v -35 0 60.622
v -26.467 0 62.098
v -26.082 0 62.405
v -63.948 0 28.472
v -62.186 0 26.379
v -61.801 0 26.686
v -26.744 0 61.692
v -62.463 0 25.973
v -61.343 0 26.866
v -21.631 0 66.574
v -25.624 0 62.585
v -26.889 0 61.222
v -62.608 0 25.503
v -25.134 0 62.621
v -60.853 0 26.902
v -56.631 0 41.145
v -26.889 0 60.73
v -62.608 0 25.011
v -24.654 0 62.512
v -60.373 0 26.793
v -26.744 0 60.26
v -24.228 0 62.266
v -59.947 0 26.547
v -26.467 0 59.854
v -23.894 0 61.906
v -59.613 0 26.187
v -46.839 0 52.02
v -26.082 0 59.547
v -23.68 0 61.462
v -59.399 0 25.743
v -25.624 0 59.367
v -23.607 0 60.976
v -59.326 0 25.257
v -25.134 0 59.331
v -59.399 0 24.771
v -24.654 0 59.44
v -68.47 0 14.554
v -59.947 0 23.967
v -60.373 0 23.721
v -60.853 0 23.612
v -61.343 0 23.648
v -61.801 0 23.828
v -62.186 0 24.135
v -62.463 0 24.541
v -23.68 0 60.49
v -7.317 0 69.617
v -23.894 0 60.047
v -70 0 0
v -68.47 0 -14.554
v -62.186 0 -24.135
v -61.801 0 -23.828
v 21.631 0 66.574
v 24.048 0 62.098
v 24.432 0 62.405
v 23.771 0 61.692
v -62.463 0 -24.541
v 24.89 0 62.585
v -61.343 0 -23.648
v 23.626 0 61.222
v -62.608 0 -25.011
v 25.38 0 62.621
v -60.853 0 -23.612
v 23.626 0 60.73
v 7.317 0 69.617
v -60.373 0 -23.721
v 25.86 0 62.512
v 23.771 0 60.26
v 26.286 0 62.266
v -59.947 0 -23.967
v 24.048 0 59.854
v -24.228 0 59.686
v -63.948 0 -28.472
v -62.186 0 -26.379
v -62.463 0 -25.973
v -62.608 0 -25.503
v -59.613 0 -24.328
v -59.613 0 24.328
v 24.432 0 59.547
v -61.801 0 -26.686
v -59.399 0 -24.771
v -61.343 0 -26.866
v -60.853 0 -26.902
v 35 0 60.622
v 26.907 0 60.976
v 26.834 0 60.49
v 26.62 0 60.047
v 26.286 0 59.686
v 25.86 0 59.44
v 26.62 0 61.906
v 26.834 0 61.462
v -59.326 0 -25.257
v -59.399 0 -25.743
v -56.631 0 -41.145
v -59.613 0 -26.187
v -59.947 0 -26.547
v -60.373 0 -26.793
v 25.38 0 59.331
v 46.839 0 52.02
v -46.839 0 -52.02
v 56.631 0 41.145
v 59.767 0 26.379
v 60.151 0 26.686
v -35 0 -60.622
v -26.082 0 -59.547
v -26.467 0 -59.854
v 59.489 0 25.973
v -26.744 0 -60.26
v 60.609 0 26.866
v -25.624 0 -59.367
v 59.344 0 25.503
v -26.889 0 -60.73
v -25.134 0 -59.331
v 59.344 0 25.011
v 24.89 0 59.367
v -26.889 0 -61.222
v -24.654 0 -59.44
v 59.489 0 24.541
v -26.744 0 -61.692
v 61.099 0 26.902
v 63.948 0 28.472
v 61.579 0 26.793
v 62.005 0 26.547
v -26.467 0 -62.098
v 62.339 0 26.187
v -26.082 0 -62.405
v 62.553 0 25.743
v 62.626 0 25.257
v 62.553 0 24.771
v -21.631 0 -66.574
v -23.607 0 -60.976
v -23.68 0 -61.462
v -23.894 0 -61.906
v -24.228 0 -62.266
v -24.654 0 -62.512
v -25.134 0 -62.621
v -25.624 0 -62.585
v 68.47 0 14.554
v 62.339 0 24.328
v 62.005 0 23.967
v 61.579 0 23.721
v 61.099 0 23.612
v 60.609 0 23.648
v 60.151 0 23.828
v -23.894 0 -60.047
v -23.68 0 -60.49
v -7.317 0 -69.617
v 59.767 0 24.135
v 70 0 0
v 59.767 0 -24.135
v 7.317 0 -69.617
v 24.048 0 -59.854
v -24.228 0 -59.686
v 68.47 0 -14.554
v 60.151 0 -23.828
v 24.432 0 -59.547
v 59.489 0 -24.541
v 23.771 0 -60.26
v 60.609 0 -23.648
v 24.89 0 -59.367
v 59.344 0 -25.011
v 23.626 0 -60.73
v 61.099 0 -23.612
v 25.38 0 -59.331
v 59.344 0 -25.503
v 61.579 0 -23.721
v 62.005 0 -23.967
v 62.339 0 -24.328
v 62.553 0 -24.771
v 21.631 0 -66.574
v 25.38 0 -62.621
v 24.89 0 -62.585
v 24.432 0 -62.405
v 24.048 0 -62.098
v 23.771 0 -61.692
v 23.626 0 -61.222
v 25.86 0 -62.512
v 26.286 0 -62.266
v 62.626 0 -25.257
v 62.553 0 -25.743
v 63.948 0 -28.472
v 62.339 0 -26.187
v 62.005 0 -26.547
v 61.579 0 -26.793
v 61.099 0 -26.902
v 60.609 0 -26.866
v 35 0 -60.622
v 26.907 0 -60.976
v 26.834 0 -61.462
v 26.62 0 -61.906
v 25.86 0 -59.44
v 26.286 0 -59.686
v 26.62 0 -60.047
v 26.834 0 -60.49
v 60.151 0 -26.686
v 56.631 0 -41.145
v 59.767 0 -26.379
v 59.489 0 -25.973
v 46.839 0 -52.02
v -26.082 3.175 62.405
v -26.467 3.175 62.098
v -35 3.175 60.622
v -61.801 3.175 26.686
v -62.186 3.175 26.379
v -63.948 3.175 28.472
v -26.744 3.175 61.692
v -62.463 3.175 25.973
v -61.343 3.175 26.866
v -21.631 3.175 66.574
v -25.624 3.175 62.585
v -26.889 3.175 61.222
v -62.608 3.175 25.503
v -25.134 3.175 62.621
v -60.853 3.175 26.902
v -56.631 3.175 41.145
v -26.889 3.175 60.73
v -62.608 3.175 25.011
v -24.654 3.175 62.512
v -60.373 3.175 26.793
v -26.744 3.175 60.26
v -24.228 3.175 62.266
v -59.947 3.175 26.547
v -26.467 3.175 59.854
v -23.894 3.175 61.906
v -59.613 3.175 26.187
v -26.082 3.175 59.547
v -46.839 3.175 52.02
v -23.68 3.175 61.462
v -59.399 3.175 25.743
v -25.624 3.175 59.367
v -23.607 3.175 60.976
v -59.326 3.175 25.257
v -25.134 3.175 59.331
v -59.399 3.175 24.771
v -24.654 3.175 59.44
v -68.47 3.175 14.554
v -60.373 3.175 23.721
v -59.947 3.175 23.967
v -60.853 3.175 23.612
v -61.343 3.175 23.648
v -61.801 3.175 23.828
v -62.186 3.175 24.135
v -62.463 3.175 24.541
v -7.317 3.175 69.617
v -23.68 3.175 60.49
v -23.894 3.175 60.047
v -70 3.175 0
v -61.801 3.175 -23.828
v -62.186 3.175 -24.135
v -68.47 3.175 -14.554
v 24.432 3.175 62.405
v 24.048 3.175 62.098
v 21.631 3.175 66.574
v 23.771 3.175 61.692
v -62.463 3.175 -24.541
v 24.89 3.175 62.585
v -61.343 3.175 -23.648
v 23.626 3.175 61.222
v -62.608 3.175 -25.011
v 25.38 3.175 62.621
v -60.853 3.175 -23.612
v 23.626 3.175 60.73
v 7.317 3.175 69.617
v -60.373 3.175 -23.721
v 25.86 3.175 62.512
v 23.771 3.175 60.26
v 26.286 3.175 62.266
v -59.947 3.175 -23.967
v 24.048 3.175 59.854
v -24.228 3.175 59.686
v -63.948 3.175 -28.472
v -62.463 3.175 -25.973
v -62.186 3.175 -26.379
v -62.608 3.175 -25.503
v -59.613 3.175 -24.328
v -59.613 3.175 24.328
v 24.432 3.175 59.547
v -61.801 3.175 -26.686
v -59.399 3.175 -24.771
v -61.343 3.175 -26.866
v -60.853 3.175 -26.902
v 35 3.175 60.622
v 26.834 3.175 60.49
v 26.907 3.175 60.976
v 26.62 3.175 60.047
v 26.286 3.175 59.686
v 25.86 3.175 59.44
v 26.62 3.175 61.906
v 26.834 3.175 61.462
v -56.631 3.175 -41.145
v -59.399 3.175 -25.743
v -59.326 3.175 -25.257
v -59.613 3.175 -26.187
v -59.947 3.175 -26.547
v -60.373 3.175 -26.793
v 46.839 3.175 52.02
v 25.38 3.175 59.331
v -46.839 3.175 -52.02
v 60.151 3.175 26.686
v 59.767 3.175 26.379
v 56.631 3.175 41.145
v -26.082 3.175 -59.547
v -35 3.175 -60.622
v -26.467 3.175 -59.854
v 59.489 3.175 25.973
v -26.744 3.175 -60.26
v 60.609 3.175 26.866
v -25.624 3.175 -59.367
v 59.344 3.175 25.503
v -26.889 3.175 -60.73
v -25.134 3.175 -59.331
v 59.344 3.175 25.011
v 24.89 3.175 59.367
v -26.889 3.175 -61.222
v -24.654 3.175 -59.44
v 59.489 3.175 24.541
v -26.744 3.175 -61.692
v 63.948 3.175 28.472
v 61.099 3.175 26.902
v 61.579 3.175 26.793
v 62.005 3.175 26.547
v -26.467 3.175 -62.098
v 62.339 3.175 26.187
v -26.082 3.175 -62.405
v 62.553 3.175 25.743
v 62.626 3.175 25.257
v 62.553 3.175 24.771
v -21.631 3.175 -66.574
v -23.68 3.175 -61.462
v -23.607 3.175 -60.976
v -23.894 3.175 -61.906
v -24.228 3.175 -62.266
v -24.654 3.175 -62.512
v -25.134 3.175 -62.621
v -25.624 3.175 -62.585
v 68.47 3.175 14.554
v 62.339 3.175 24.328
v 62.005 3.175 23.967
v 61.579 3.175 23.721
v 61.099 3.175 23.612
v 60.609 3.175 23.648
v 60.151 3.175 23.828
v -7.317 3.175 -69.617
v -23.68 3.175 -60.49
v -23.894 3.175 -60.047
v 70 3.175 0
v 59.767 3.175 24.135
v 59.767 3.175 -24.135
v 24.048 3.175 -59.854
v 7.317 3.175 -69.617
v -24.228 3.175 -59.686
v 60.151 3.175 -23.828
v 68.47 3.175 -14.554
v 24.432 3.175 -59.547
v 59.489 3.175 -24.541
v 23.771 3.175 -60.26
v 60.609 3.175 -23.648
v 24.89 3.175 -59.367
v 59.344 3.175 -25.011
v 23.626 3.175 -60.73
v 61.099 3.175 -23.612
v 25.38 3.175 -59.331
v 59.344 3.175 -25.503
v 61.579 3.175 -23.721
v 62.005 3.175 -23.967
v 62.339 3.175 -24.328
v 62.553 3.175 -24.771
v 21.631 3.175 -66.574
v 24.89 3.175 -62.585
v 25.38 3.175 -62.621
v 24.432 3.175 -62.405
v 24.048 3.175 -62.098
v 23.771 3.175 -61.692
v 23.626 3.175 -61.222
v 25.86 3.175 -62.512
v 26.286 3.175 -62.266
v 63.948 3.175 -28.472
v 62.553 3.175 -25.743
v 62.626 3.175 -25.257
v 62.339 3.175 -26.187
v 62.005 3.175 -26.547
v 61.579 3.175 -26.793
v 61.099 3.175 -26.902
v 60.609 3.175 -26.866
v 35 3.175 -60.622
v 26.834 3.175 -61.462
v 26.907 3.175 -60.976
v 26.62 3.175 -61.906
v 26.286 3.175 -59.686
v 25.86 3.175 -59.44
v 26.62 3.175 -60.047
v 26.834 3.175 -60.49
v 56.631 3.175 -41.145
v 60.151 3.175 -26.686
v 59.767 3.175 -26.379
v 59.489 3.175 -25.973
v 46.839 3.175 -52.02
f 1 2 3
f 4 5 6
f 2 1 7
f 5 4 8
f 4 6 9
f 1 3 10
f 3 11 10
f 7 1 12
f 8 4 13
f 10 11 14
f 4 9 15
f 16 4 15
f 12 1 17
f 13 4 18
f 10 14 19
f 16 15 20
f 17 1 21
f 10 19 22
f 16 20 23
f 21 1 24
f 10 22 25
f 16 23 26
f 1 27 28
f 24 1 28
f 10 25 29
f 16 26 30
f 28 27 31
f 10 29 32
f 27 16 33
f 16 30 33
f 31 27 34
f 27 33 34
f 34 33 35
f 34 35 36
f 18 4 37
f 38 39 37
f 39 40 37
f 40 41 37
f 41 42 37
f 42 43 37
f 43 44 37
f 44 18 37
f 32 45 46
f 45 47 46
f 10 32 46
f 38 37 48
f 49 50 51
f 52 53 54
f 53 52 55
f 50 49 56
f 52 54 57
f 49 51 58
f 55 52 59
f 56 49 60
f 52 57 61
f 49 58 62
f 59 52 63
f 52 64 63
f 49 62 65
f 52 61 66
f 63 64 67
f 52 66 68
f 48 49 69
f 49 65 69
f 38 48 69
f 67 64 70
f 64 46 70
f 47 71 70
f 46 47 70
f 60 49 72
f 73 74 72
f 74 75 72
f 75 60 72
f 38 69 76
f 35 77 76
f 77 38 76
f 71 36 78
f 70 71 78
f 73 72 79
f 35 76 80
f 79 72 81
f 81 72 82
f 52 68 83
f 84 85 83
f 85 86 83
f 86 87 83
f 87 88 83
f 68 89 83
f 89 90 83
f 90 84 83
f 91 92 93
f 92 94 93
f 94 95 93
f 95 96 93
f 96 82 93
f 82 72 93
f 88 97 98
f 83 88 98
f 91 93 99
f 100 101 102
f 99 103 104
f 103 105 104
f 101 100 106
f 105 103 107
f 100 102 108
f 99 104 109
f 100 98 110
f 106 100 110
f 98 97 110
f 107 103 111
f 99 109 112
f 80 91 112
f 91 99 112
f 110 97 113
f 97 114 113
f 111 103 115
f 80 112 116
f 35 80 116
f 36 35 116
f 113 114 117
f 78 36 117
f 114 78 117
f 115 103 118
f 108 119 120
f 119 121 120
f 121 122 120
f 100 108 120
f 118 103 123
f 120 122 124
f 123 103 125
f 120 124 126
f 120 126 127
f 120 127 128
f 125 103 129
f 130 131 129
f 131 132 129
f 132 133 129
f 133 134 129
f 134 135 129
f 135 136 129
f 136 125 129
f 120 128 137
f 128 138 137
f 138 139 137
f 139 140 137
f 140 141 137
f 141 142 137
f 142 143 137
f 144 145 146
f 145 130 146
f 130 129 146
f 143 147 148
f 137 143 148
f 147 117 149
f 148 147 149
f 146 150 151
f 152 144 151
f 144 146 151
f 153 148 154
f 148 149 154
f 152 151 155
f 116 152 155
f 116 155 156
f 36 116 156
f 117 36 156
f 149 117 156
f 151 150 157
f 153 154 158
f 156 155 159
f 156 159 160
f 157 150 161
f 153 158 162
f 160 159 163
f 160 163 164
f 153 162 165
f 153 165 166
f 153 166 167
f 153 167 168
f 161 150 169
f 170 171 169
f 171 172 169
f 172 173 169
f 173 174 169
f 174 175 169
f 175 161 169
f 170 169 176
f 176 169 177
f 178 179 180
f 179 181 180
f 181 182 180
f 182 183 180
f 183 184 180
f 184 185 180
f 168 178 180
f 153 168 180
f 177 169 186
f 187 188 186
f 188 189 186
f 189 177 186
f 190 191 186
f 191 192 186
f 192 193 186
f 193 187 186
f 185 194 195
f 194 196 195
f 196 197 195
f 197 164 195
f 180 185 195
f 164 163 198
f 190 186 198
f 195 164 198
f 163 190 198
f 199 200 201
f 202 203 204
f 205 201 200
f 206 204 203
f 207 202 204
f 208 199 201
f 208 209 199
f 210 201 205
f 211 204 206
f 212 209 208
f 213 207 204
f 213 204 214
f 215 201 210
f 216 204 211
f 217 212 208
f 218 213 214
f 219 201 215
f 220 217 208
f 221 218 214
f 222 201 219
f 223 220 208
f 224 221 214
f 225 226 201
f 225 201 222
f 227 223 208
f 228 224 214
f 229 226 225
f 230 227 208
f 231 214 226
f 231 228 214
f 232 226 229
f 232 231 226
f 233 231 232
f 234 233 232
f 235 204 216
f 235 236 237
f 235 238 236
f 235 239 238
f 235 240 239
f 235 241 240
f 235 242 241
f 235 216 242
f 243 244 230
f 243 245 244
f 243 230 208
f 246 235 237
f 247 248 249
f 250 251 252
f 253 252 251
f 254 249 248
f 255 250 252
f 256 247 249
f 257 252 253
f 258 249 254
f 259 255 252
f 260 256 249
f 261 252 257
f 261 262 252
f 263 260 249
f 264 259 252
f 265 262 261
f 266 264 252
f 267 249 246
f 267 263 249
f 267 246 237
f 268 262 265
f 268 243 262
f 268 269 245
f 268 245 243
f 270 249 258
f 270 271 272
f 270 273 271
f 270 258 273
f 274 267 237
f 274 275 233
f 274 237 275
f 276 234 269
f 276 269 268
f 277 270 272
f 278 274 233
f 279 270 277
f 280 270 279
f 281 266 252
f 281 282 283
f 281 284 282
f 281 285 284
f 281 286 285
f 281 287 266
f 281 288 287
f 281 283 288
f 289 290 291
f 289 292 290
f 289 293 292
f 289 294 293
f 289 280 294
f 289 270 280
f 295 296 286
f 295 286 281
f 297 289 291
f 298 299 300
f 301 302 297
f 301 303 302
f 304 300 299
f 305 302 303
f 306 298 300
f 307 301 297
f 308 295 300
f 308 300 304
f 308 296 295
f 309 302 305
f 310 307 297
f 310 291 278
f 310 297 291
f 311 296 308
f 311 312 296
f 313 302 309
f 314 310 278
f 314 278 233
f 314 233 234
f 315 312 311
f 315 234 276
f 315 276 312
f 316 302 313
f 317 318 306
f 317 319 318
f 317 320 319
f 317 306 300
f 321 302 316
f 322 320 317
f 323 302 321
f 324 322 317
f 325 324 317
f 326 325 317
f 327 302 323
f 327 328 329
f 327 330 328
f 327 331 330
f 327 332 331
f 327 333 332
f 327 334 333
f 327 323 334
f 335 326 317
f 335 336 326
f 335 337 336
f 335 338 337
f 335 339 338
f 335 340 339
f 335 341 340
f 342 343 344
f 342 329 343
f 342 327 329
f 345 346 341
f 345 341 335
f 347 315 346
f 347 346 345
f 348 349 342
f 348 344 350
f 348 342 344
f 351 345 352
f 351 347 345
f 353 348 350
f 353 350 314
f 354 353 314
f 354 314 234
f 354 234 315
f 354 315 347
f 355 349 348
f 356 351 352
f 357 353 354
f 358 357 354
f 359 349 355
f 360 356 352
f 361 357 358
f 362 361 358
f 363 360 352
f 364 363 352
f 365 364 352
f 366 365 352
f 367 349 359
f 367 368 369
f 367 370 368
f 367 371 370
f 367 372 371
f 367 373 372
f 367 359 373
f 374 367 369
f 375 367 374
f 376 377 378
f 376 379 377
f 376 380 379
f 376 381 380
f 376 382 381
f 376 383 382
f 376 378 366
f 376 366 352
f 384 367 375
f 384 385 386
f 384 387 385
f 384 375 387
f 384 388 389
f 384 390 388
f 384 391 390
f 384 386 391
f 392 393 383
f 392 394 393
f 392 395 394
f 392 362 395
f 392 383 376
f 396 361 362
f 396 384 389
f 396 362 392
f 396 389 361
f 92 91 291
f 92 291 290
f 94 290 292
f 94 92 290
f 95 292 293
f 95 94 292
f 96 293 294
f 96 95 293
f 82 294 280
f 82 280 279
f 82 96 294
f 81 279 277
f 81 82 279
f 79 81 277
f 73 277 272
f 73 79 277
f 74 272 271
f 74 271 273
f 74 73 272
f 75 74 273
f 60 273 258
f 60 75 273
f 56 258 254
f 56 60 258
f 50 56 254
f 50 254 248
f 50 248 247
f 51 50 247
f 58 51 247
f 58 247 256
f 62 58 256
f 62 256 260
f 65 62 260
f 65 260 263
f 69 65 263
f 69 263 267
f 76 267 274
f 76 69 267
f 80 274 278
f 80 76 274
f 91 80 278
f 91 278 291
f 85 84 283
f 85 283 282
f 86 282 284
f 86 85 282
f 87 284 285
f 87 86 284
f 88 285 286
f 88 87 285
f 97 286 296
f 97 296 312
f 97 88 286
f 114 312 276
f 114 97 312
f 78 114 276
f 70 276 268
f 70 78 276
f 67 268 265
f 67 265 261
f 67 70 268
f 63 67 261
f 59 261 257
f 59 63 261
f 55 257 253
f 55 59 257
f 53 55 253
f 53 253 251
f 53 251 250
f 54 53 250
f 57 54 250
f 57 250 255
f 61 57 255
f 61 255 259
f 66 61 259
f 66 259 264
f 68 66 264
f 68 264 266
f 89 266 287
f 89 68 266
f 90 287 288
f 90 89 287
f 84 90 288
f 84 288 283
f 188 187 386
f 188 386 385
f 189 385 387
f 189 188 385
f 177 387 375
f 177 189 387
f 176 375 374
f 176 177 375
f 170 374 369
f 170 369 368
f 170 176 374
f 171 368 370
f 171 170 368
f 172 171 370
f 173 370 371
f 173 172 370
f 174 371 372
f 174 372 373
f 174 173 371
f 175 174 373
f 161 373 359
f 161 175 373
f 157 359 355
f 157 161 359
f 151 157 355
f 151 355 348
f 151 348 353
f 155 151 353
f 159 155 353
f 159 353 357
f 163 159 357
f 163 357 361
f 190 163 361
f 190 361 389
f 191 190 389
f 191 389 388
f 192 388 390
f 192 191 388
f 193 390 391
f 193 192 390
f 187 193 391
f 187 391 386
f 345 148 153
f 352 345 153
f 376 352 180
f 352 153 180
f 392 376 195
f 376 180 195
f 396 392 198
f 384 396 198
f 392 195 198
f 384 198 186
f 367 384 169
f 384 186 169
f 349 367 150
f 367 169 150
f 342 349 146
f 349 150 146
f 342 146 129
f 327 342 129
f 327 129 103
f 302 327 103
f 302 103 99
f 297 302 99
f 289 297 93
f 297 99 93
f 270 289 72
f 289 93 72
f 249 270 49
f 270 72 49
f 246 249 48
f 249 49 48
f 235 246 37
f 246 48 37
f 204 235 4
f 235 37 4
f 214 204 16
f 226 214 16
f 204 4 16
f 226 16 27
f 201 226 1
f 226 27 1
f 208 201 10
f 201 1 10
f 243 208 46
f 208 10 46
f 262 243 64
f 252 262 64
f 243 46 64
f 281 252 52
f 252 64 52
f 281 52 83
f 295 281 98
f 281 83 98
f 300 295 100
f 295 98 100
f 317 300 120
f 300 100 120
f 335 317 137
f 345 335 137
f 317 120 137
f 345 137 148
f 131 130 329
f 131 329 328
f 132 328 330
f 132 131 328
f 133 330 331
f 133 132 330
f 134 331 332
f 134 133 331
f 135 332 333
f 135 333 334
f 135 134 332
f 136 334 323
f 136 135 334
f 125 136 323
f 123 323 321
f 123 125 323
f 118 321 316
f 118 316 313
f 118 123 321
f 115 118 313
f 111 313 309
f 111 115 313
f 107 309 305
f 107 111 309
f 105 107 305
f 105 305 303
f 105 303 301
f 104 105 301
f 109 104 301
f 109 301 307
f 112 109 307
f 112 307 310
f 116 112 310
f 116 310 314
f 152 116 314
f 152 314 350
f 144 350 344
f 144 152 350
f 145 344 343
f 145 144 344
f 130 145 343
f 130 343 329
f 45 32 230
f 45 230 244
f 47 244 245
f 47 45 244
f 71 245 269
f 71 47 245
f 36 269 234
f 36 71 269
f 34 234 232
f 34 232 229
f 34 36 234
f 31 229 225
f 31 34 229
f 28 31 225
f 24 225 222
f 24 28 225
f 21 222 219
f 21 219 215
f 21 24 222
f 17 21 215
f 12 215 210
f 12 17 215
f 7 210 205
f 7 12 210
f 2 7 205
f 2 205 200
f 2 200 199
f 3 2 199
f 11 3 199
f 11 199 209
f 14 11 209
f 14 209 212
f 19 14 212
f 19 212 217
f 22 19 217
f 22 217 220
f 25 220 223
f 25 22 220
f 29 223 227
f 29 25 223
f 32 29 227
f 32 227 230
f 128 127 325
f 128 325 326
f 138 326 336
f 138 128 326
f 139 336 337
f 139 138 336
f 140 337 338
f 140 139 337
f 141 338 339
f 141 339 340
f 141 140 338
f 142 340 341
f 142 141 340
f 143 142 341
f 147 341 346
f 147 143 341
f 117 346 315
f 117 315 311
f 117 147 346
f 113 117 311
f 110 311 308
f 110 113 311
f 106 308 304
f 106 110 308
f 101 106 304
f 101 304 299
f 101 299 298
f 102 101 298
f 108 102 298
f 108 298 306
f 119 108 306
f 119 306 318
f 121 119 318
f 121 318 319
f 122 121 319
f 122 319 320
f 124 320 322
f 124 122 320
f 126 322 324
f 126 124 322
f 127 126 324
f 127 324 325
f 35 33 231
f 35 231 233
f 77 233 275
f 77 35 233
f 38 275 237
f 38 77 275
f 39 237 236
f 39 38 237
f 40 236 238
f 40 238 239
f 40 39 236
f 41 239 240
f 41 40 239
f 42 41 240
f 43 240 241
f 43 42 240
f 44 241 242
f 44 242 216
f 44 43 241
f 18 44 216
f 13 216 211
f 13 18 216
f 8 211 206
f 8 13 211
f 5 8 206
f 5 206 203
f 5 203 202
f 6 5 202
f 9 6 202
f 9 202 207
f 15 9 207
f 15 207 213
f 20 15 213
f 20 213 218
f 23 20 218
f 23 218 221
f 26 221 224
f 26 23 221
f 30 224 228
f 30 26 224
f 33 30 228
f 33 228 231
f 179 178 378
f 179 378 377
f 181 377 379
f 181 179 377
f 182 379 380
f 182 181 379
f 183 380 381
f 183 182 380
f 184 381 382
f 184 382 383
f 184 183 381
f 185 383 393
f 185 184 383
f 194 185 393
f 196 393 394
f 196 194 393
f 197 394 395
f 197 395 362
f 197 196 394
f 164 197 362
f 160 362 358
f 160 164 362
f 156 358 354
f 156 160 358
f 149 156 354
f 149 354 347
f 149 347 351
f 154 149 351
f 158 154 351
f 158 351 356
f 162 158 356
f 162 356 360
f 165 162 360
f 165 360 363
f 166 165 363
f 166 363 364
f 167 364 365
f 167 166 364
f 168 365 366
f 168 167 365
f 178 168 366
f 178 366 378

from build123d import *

# Parameters (mm, degrees)
BASE_W_MOTOR_MOUNTS_R  = 70
BOSS_EXTRUDE1_DEPTH    = 3.175
STANDOFFS_TOP_BOTTOM_R = 1.65
CUT_EXTRUDE2_DEPTH     = 3.175


with BuildPart() as part:
    # Base w/ Motor Mounts → Boss-Extrude1 (new body)
    with BuildSketch(Plane(origin=(0, 0, 0), x_dir=(1, 0, 0), z_dir=(0, 1, 0))):
        Circle(BASE_W_MOTOR_MOUNTS_R)
    extrude(amount=BOSS_EXTRUDE1_DEPTH)

    # Standoffs (top / bottom) → Cut-Extrude2 (cut)
    with BuildSketch(Plane(origin=(0, 0, 0), x_dir=(1, 0, 0), z_dir=(0, 1, 0))):
        with Locations((25.257106536, 60.976049146)):
            Circle(STANDOFFS_TOP_BOTTOM_R)
        with Locations((60.976049146, 25.257106536)):
            Circle(STANDOFFS_TOP_BOTTOM_R)
        with Locations((60.976049146, -25.257106536)):
            Circle(STANDOFFS_TOP_BOTTOM_R)
        with Locations((25.257106536, -60.976049146)):
            Circle(STANDOFFS_TOP_BOTTOM_R)
        with Locations((-25.257106536, -60.976049146)):
            Circle(STANDOFFS_TOP_BOTTOM_R)
        with Locations((-60.976049146, -25.257106536)):
            Circle(STANDOFFS_TOP_BOTTOM_R)
        with Locations((-60.976049146, 25.257106536)):
            Circle(STANDOFFS_TOP_BOTTOM_R)
        with Locations((-25.257106536, 60.976049146)):
            Circle(STANDOFFS_TOP_BOTTOM_R)
    extrude(amount=CUT_EXTRUDE2_DEPTH, mode=Mode.SUBTRACT)


solid = part.part
